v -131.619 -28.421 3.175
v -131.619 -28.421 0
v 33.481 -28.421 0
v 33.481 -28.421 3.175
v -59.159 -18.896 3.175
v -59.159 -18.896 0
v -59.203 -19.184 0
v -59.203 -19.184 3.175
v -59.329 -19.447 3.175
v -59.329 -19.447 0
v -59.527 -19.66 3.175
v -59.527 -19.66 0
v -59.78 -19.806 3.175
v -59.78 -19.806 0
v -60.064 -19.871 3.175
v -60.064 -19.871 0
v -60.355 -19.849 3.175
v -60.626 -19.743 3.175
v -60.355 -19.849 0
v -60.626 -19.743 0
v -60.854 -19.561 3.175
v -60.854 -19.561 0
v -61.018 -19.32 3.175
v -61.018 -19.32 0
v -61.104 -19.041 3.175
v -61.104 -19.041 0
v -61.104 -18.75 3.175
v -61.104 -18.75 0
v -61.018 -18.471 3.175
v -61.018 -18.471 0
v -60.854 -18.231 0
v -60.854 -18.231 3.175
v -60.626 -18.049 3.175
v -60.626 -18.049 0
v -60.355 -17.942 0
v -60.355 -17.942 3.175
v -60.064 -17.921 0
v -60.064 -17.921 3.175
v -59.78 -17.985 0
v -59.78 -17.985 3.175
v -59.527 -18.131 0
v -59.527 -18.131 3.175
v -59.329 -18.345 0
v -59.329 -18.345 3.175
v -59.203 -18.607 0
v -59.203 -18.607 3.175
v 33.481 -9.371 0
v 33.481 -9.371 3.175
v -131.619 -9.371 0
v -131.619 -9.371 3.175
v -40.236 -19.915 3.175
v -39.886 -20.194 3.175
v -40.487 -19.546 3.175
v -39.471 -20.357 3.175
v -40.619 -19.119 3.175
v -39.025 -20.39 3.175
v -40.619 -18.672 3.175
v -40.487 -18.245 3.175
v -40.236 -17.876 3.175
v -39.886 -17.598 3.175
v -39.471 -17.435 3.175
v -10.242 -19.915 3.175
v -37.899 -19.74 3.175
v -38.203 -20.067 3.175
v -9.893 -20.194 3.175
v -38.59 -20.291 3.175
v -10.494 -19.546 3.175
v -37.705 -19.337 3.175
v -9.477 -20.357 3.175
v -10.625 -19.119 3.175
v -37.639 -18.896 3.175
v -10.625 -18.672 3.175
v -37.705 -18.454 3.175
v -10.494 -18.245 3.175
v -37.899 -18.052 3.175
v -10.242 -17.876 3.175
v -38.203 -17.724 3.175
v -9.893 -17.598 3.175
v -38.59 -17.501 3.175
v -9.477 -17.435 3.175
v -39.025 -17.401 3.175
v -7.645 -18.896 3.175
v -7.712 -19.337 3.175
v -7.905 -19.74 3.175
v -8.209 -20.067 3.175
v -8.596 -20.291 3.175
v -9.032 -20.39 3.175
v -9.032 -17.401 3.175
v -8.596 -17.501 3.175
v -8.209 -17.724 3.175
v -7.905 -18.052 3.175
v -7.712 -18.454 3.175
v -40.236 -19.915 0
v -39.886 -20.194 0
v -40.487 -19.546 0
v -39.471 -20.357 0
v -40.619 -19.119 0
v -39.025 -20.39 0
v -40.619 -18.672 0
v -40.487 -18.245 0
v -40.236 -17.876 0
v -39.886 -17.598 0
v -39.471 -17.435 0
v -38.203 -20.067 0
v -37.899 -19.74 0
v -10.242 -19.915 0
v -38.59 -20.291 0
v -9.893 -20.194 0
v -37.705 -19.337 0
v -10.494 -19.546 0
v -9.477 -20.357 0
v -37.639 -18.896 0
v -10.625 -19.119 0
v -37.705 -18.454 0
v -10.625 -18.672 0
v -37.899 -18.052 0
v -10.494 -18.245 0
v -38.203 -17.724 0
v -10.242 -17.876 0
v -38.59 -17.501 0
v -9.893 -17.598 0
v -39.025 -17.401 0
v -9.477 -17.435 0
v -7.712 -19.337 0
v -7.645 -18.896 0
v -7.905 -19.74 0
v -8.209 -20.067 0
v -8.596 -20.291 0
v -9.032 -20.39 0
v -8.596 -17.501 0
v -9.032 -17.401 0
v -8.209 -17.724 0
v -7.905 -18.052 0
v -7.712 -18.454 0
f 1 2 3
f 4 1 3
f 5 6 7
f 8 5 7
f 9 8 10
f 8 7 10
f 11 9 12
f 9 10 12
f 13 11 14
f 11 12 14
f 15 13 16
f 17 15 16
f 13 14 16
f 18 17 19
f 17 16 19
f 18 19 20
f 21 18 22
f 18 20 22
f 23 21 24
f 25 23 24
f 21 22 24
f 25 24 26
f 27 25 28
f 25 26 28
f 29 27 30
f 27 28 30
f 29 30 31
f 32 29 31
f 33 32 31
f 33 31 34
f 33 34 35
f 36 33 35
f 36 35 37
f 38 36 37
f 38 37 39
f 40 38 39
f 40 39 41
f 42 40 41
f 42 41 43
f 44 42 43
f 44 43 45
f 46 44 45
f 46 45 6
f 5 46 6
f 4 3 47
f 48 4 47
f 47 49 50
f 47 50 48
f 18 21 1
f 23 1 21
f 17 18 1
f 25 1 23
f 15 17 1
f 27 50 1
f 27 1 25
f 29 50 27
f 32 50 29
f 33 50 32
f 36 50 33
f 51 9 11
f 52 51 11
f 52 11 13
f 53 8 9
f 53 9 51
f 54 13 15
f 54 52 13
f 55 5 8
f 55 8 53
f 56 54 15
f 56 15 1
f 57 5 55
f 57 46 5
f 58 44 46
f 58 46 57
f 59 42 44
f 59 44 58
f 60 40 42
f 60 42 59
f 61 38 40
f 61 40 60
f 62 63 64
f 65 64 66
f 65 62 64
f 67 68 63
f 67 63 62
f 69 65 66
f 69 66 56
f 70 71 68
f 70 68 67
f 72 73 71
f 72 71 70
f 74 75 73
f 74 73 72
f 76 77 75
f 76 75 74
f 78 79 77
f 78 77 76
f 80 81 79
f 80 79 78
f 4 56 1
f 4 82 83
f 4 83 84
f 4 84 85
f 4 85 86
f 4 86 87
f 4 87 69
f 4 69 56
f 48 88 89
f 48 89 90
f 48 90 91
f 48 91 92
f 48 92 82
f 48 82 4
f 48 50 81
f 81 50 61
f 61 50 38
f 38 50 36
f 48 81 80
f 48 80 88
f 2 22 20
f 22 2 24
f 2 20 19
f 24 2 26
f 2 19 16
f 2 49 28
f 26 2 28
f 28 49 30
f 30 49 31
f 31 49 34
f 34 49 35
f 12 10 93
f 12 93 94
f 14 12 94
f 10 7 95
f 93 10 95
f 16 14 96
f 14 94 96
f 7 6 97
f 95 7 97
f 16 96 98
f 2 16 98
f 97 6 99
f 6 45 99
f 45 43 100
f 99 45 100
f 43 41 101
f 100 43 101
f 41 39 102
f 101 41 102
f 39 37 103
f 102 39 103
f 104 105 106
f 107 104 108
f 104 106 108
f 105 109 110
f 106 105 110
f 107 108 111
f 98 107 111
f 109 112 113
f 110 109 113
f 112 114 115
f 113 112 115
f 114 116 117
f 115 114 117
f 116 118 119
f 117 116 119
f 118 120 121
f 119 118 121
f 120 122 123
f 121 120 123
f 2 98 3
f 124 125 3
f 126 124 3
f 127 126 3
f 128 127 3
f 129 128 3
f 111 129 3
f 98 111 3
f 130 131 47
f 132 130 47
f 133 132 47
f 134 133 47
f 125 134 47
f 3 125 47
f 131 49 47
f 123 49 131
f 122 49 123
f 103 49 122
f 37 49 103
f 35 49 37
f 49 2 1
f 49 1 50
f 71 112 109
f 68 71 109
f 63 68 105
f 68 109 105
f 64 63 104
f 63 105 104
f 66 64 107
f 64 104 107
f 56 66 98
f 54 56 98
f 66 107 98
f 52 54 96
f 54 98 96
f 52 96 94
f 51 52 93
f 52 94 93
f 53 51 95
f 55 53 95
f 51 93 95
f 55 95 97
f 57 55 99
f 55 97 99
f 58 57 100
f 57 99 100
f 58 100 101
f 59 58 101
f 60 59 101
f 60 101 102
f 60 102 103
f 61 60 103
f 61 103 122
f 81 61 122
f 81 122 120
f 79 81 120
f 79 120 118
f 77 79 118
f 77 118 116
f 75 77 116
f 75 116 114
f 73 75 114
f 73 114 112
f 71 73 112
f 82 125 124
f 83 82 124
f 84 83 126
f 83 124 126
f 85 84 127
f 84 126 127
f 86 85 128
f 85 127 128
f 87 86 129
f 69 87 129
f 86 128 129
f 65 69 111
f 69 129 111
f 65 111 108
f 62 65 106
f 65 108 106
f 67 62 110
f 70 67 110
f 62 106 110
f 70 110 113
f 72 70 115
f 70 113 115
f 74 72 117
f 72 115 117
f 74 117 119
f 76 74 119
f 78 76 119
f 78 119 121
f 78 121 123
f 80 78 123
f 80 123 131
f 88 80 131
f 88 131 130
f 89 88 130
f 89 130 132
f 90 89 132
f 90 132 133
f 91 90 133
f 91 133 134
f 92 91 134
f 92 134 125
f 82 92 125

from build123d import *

# Parameters (mm, degrees)
F0_W     = 165.1
F0_H     = 19.05
F1_DEPTH = 3.175
F2_R     = 1.4986
F3_DEPTH = 25.4
F2_R_2   = 0.9779
F4_DEPTH = 25.4
F5_DEPTH = 25.4


with BuildPart() as f1:
    # F0 (on Top) → F1 (new body)
    with BuildSketch(Plane.XY):
        with Locations((-49.068541, -18.8957)):
            Rectangle(F0_W, F0_H)
    extrude(amount=F1_DEPTH)

    # F2 (on face) → F3 (cut)
    with BuildSketch(Plane(origin=(0, 0, 0), x_dir=(1, 0, 0), z_dir=(0, 0, -1))):
        with Locations((-39.137141, 18.8957)):
            Circle(F2_R)
    extrude(amount=-F3_DEPTH, mode=Mode.SUBTRACT)

    # F2 (on face) → F4 (cut)
    with BuildSketch(Plane(origin=(0, 0, 0), x_dir=(1, 0, 0), z_dir=(0, 0, -1))):
        with Locations((-60.137141, 18.8957)):
            Circle(F2_R_2)
    extrude(amount=-F4_DEPTH, mode=Mode.SUBTRACT)

    # F2 (on face) → F5 (cut)
    with BuildSketch(Plane(origin=(0, 0, 0), x_dir=(1, 0, 0), z_dir=(0, 0, -1))):
        with Locations((-9.143541, 18.8957)):
            Circle(F2_R)
    extrude(amount=-F5_DEPTH, mode=Mode.SUBTRACT)


solid = f1.part
